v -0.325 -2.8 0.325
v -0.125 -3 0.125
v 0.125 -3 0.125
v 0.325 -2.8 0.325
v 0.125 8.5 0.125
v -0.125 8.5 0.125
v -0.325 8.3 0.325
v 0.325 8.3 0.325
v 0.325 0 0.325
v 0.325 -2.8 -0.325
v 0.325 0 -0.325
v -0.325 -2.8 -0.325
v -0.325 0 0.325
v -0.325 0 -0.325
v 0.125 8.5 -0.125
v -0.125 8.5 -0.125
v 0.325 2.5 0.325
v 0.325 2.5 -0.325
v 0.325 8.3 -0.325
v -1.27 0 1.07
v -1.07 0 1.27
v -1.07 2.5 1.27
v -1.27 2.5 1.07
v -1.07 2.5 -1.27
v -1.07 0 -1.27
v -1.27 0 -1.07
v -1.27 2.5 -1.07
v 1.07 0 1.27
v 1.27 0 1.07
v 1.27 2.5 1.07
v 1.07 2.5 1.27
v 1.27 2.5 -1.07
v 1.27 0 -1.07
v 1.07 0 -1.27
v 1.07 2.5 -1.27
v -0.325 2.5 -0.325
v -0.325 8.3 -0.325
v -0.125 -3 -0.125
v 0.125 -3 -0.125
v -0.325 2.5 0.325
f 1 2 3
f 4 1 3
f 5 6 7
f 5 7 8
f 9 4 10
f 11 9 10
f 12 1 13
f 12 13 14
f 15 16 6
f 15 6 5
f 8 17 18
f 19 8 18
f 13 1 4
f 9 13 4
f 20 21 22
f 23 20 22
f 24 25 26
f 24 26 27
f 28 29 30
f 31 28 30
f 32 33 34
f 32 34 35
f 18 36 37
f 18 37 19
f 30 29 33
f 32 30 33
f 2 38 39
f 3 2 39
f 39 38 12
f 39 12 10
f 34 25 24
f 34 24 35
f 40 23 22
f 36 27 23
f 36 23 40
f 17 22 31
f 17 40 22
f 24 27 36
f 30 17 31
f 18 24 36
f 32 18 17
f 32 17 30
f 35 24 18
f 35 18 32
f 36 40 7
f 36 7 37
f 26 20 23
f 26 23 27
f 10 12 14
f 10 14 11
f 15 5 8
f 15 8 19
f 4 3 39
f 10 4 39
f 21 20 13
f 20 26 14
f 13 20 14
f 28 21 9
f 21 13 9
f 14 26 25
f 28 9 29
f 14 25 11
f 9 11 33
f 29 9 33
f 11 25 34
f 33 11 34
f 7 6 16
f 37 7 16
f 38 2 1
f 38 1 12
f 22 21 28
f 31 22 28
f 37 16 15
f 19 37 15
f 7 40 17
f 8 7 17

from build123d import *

# Parameters (mm, degrees)
SKETCH1_W                = 2.54
SKETCH1_H                = 2.54
BOSS_EXTRUDE1_DEPTH      = 2.5
BOSS_EXTRUDE2_DEPTH      = 6
BOSS_EXTRUDE2_DEPTH_BACK = 5.5
SKETCH2_W                = 0.65
SKETCH2_H                = 0.65
CHAMFER1_SIZE            = 0.2
CHAMFER2_SIZE            = 0.2


with BuildPart() as part:
    # Sketch1 → Boss-Extrude1 (new body)
    with BuildSketch(Plane(origin=(0, 0, 0), x_dir=(1, 0, 0), z_dir=(0, 1, 0))):
        Rectangle(SKETCH1_W, SKETCH1_H)
    extrude(amount=BOSS_EXTRUDE1_DEPTH)

    # Sketch2 → Boss-Extrude2 (add, two sides: drawn at the far end of the back side and taken through both)
    with BuildSketch(Plane(origin=(0, 2.5, 0), x_dir=(1, 0, 0), z_dir=(0, 1, 0)).offset(-BOSS_EXTRUDE2_DEPTH_BACK)):
        Rectangle(SKETCH2_W, SKETCH2_H)
    extrude(amount=BOSS_EXTRUDE2_DEPTH + BOSS_EXTRUDE2_DEPTH_BACK)

    # Chamfer1
    chamfer1_edges = [part.edges().sort_by_distance(p)[0] for p in [
        (1.27, 1.25, 1.27),
        (-1.27, 1.25, 1.27),
        (-1.27, 1.25, -1.27),
        (1.27, 1.25, -1.27),
    ]]
    chamfer(chamfer1_edges, length=CHAMFER1_SIZE)

    # Chamfer2
    chamfer2_edges = [part.edges().sort_by_distance(p)[0] for p in [
        (0.325, -3, 0),
        (0, -3, 0.325),
        (-0.325, -3, 0),
        (0, -3, -0.325),
        (0.325, 8.5, 0),
        (0, 8.5, -0.325),
        (-0.325, 8.5, 0),
        (0, 8.5, 0.325),
    ]]
    chamfer(chamfer2_edges, length=CHAMFER2_SIZE)


solid = part.part
